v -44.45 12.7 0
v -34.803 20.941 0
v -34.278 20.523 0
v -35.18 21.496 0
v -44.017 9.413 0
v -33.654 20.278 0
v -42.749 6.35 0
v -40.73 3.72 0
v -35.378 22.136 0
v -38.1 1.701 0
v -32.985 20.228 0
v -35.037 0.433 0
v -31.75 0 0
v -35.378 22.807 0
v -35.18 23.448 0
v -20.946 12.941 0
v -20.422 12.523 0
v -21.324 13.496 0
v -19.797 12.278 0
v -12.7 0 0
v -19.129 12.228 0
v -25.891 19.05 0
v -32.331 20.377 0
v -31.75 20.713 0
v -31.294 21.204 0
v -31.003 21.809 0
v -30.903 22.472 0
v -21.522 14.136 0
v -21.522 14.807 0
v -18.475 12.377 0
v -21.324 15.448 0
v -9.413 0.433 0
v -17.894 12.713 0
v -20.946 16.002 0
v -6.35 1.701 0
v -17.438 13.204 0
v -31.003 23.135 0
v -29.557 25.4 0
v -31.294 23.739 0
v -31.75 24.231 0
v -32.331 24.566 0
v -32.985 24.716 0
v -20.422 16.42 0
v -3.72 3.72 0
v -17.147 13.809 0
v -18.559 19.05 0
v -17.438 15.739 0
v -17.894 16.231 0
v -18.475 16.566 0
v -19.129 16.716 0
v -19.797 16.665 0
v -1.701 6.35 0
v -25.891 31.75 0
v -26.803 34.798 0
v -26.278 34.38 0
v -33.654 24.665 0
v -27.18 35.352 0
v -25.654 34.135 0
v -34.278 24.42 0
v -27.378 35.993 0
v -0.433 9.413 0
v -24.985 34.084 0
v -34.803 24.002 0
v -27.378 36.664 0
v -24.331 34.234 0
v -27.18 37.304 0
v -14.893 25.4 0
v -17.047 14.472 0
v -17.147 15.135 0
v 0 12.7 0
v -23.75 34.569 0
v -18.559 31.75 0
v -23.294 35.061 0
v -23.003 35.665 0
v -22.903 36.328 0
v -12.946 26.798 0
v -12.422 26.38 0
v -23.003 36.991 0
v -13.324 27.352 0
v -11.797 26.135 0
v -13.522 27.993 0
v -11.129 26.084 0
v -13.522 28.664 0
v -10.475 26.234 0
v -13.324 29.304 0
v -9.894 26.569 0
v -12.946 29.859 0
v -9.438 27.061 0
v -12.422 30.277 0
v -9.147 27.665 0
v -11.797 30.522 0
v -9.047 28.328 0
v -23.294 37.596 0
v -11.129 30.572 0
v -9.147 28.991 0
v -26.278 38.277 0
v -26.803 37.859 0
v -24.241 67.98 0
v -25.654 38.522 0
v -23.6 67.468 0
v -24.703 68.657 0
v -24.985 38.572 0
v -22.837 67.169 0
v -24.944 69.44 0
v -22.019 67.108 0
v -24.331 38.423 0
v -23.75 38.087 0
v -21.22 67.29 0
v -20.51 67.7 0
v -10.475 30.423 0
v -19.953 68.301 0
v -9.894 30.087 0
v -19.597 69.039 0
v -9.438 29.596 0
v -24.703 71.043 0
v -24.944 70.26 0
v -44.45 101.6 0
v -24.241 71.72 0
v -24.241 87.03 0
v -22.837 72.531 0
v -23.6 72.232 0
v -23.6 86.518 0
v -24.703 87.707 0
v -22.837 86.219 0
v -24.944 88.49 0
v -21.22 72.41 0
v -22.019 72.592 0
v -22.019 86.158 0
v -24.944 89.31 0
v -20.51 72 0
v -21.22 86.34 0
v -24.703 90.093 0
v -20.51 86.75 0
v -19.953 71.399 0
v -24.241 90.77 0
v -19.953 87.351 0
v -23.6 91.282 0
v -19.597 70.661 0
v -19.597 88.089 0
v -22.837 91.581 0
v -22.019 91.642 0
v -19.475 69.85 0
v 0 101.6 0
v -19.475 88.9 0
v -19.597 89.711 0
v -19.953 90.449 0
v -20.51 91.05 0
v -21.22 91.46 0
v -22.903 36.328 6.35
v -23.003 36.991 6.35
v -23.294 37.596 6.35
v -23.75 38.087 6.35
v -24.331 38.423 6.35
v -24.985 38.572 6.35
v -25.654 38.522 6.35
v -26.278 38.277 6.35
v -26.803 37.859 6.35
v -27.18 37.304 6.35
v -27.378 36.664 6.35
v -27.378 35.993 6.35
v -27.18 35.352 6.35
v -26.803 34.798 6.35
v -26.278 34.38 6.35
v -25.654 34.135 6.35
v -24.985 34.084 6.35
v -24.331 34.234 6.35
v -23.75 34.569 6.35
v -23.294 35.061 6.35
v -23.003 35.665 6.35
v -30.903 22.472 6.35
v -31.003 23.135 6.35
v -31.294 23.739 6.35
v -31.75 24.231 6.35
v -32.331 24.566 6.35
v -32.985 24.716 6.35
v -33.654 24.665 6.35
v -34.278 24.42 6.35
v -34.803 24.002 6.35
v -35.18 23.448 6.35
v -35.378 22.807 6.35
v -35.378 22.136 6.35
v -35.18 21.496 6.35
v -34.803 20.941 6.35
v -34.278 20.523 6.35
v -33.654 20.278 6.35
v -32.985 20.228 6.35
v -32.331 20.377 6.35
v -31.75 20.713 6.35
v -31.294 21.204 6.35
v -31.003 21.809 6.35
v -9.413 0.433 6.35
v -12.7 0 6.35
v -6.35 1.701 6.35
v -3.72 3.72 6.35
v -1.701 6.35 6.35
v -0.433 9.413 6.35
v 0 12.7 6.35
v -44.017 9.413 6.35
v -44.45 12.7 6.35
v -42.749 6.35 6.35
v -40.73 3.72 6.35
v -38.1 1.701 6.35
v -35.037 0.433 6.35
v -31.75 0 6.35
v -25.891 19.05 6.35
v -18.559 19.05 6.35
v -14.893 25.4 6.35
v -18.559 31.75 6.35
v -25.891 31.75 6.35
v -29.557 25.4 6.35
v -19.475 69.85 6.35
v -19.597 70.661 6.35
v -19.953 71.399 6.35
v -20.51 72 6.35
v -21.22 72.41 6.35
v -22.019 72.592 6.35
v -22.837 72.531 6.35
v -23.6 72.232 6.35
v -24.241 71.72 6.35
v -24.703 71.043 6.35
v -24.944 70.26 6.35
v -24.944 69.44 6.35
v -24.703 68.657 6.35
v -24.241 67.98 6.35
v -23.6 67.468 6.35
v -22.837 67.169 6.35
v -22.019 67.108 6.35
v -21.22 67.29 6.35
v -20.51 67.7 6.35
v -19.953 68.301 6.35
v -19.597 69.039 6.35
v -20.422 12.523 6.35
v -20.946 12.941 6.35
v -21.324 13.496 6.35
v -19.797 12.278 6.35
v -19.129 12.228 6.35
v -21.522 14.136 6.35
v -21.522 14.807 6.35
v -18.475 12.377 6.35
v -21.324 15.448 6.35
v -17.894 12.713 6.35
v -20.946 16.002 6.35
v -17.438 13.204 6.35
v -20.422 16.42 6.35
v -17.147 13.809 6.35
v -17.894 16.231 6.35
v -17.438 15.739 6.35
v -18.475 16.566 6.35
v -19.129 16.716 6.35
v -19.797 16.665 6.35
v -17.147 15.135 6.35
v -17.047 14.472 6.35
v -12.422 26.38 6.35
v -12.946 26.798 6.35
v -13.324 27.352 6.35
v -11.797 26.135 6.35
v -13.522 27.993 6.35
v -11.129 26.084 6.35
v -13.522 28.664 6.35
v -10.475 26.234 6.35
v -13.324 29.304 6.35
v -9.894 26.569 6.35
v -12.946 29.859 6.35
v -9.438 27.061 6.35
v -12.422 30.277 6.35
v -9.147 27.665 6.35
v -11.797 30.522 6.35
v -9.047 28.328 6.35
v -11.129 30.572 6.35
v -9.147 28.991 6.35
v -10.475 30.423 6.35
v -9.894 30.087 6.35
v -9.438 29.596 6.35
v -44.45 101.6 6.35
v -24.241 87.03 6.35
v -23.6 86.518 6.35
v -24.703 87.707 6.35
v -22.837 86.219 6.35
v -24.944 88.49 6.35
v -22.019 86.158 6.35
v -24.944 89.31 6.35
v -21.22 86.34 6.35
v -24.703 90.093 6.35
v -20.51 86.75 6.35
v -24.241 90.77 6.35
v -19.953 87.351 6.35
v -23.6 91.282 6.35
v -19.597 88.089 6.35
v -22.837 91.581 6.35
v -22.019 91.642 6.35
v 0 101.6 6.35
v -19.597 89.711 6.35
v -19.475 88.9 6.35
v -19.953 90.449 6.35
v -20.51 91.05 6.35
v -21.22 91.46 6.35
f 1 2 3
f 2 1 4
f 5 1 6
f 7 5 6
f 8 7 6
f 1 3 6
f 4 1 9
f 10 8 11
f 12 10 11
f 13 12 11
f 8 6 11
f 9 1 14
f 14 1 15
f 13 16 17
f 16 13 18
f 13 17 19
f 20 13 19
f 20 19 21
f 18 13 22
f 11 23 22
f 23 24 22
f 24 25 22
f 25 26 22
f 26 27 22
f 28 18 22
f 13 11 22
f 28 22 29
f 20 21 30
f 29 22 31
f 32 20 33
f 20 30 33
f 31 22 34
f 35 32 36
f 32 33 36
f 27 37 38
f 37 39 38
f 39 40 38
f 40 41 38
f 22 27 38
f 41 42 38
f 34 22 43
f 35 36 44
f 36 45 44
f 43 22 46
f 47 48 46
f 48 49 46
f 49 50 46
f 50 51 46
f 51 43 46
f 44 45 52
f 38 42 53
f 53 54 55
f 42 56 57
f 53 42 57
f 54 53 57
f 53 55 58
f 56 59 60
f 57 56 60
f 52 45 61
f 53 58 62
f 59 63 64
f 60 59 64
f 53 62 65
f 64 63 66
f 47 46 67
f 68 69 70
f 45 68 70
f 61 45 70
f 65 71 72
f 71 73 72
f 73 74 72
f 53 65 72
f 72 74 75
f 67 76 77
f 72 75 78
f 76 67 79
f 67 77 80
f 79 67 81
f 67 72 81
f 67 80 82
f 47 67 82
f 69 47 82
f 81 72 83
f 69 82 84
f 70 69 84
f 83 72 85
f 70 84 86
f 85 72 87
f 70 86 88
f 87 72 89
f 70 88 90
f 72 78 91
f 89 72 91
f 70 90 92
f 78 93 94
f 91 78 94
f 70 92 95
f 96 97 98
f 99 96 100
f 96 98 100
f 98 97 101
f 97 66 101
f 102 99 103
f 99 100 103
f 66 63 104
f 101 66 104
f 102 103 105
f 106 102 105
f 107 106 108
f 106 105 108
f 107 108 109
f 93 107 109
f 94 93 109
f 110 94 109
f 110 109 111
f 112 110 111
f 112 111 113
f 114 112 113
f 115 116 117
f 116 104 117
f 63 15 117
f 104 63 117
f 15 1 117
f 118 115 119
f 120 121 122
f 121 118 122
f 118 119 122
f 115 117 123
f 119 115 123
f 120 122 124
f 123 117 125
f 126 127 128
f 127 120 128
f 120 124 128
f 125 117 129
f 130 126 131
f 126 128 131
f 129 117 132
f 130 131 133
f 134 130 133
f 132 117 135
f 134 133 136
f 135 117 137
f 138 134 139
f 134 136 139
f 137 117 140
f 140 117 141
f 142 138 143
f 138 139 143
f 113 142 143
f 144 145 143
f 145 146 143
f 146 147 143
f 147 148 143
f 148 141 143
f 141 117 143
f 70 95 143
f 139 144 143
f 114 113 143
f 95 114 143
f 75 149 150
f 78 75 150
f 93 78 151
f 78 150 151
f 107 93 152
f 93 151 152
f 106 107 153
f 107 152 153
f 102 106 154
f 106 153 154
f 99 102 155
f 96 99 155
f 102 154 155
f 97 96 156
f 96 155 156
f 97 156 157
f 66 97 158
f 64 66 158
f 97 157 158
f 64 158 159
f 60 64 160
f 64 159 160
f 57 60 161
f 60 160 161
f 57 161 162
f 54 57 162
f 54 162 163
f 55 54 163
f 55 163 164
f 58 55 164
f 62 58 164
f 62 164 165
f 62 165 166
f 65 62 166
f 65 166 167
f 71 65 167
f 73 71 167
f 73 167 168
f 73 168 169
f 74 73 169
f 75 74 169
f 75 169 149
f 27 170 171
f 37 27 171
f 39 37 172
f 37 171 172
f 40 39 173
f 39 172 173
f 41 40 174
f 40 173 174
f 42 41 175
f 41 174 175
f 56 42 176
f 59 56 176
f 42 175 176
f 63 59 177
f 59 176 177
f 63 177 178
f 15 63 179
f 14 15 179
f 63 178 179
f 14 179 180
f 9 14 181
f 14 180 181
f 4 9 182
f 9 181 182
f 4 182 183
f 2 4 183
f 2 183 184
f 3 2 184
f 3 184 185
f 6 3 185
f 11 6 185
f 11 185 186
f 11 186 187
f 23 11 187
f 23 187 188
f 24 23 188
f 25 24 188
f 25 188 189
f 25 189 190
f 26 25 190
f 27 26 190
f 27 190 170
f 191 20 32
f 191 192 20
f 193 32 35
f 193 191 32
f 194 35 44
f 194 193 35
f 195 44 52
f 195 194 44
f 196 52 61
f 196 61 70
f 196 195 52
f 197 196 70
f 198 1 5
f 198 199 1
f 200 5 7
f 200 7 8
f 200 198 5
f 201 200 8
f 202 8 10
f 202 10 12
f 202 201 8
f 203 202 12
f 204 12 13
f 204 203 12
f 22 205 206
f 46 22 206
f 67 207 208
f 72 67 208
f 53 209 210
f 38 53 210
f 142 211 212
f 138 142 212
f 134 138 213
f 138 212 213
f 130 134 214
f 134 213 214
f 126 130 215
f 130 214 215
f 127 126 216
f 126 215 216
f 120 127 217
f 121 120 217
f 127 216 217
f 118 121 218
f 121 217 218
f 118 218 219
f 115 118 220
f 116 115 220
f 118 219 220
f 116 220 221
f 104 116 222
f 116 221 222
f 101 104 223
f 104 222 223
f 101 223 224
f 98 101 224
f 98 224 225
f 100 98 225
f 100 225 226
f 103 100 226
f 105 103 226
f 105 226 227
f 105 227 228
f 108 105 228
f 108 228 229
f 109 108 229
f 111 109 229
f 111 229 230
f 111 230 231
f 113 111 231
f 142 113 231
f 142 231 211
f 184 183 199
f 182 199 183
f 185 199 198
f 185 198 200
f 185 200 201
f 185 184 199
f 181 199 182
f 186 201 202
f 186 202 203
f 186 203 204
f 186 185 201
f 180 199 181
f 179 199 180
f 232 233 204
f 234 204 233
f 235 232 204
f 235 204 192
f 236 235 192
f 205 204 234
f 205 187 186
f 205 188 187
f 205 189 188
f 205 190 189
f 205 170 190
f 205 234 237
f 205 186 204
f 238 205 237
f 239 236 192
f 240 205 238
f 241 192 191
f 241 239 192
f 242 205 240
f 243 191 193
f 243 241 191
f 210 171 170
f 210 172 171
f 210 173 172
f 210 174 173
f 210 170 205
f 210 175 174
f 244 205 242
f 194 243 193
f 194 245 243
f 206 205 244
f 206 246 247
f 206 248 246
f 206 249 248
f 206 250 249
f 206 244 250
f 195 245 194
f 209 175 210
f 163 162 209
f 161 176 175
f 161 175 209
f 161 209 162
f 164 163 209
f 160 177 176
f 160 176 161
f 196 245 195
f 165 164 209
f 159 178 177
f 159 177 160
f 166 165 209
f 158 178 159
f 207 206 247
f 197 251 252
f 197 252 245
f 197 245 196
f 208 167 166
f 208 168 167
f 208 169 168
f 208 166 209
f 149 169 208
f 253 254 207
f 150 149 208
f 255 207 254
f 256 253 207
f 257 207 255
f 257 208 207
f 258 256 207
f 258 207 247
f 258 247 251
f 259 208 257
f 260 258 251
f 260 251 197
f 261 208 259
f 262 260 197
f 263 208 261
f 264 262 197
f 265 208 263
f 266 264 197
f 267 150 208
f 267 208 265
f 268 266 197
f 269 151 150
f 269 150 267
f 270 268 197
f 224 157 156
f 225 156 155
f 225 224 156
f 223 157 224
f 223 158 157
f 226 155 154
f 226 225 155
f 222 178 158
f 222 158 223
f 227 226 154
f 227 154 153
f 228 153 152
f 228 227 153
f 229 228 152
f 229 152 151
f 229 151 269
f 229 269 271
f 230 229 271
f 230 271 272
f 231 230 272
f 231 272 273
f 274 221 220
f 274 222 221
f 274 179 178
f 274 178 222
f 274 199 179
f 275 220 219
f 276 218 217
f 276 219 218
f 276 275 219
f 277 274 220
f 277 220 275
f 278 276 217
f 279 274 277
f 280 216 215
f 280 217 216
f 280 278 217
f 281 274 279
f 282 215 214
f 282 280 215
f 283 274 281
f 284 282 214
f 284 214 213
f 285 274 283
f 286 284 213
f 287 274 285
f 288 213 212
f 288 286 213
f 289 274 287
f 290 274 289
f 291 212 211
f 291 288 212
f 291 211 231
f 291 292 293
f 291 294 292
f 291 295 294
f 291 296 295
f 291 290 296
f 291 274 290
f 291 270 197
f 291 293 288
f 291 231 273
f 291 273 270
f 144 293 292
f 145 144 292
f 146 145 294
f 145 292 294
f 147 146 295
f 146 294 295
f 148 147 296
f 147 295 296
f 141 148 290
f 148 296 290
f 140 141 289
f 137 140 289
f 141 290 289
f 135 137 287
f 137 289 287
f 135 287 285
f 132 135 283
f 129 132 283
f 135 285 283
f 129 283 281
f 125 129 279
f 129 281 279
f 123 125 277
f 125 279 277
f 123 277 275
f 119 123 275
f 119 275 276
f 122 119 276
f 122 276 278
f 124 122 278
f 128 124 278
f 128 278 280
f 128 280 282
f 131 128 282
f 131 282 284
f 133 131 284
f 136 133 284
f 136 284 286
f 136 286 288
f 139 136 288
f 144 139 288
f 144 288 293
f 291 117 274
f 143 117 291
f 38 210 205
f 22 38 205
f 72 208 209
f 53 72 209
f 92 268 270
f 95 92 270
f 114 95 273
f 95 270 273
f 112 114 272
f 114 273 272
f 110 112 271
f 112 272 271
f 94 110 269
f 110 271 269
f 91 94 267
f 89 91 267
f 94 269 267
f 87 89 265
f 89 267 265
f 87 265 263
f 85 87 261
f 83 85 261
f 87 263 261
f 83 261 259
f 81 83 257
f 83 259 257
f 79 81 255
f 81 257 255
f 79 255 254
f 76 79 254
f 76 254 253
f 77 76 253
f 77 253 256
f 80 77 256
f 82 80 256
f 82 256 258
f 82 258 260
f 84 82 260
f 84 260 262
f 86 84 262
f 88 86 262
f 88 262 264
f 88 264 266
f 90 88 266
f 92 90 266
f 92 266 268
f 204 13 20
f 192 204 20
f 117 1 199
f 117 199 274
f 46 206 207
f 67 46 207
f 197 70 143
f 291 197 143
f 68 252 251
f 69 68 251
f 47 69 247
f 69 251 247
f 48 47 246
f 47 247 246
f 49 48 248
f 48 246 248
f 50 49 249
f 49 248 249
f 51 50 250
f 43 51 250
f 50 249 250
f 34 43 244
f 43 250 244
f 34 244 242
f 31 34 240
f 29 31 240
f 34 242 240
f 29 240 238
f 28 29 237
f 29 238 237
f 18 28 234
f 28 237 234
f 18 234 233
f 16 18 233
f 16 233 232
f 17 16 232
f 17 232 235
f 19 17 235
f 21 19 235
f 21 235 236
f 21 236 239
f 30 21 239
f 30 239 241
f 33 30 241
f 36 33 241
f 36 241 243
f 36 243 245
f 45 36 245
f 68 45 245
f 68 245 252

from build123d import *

# Parameters (mm, degrees)
SKETCH1_W            = 44.45
SKETCH1_H            = 101.6
BOSS_EXTRUDE2_DEPTH  = 6.35
FILLET1_R            = 12.7
M5_CLEARANCE_HOLE1_D = 5.5
CUT_EXTRUDE1_DEPTH   = 112.079633597
M4_CLEARANCE_HOLE1_D = 4.5


with BuildPart() as part:
    # Sketch1 → Boss-Extrude2 (new body)
    with BuildSketch(Plane.XY):
        with Locations((-22.225, 50.8)):
            Rectangle(SKETCH1_W, SKETCH1_H)
    extrude(amount=BOSS_EXTRUDE2_DEPTH)

    # Fillet1
    fillet1_edges = [part.edges().sort_by_distance(p)[0] for p in [
        (0, 0, 3.175),
        (-44.45, 0, 3.175),
    ]]
    fillet(fillet1_edges, radius=FILLET1_R)

    # M5 Clearance Hole1 (through all)
    with Locations(Plane(origin=(0, 0, 0), x_dir=(-1, 0, 0), z_dir=(0, 0, -1))):
        with Locations((22.225, 88.9), (22.225, 69.85)):
            Hole(M5_CLEARANCE_HOLE1_D / 2)

    # Sketch14 → Cut-Extrude1 (cut, through all)
    with BuildSketch(Plane.XY.offset(6.35)):
        Polygon((-14.892651581, 25.4), (-18.558825791, 31.75), (-25.891174209, 31.75), (-29.557348419, 25.4), (-25.891174209, 19.05), (-18.558825791, 19.05), align=None)
    extrude(amount=-CUT_EXTRUDE1_DEPTH, mode=Mode.SUBTRACT)

    # M4 Clearance Hole1 (through all)
    with Locations(Plane(origin=(0, 0, 0), x_dir=(-1, 0, 0), z_dir=(0, 0, -1))):
        with Locations((11.29679677, 28.32820323), (25.15320323, 36.32820323), (33.15320323, 22.47179677), (19.29679677, 14.47179677)):
            Hole(M4_CLEARANCE_HOLE1_D / 2)


solid = part.part
